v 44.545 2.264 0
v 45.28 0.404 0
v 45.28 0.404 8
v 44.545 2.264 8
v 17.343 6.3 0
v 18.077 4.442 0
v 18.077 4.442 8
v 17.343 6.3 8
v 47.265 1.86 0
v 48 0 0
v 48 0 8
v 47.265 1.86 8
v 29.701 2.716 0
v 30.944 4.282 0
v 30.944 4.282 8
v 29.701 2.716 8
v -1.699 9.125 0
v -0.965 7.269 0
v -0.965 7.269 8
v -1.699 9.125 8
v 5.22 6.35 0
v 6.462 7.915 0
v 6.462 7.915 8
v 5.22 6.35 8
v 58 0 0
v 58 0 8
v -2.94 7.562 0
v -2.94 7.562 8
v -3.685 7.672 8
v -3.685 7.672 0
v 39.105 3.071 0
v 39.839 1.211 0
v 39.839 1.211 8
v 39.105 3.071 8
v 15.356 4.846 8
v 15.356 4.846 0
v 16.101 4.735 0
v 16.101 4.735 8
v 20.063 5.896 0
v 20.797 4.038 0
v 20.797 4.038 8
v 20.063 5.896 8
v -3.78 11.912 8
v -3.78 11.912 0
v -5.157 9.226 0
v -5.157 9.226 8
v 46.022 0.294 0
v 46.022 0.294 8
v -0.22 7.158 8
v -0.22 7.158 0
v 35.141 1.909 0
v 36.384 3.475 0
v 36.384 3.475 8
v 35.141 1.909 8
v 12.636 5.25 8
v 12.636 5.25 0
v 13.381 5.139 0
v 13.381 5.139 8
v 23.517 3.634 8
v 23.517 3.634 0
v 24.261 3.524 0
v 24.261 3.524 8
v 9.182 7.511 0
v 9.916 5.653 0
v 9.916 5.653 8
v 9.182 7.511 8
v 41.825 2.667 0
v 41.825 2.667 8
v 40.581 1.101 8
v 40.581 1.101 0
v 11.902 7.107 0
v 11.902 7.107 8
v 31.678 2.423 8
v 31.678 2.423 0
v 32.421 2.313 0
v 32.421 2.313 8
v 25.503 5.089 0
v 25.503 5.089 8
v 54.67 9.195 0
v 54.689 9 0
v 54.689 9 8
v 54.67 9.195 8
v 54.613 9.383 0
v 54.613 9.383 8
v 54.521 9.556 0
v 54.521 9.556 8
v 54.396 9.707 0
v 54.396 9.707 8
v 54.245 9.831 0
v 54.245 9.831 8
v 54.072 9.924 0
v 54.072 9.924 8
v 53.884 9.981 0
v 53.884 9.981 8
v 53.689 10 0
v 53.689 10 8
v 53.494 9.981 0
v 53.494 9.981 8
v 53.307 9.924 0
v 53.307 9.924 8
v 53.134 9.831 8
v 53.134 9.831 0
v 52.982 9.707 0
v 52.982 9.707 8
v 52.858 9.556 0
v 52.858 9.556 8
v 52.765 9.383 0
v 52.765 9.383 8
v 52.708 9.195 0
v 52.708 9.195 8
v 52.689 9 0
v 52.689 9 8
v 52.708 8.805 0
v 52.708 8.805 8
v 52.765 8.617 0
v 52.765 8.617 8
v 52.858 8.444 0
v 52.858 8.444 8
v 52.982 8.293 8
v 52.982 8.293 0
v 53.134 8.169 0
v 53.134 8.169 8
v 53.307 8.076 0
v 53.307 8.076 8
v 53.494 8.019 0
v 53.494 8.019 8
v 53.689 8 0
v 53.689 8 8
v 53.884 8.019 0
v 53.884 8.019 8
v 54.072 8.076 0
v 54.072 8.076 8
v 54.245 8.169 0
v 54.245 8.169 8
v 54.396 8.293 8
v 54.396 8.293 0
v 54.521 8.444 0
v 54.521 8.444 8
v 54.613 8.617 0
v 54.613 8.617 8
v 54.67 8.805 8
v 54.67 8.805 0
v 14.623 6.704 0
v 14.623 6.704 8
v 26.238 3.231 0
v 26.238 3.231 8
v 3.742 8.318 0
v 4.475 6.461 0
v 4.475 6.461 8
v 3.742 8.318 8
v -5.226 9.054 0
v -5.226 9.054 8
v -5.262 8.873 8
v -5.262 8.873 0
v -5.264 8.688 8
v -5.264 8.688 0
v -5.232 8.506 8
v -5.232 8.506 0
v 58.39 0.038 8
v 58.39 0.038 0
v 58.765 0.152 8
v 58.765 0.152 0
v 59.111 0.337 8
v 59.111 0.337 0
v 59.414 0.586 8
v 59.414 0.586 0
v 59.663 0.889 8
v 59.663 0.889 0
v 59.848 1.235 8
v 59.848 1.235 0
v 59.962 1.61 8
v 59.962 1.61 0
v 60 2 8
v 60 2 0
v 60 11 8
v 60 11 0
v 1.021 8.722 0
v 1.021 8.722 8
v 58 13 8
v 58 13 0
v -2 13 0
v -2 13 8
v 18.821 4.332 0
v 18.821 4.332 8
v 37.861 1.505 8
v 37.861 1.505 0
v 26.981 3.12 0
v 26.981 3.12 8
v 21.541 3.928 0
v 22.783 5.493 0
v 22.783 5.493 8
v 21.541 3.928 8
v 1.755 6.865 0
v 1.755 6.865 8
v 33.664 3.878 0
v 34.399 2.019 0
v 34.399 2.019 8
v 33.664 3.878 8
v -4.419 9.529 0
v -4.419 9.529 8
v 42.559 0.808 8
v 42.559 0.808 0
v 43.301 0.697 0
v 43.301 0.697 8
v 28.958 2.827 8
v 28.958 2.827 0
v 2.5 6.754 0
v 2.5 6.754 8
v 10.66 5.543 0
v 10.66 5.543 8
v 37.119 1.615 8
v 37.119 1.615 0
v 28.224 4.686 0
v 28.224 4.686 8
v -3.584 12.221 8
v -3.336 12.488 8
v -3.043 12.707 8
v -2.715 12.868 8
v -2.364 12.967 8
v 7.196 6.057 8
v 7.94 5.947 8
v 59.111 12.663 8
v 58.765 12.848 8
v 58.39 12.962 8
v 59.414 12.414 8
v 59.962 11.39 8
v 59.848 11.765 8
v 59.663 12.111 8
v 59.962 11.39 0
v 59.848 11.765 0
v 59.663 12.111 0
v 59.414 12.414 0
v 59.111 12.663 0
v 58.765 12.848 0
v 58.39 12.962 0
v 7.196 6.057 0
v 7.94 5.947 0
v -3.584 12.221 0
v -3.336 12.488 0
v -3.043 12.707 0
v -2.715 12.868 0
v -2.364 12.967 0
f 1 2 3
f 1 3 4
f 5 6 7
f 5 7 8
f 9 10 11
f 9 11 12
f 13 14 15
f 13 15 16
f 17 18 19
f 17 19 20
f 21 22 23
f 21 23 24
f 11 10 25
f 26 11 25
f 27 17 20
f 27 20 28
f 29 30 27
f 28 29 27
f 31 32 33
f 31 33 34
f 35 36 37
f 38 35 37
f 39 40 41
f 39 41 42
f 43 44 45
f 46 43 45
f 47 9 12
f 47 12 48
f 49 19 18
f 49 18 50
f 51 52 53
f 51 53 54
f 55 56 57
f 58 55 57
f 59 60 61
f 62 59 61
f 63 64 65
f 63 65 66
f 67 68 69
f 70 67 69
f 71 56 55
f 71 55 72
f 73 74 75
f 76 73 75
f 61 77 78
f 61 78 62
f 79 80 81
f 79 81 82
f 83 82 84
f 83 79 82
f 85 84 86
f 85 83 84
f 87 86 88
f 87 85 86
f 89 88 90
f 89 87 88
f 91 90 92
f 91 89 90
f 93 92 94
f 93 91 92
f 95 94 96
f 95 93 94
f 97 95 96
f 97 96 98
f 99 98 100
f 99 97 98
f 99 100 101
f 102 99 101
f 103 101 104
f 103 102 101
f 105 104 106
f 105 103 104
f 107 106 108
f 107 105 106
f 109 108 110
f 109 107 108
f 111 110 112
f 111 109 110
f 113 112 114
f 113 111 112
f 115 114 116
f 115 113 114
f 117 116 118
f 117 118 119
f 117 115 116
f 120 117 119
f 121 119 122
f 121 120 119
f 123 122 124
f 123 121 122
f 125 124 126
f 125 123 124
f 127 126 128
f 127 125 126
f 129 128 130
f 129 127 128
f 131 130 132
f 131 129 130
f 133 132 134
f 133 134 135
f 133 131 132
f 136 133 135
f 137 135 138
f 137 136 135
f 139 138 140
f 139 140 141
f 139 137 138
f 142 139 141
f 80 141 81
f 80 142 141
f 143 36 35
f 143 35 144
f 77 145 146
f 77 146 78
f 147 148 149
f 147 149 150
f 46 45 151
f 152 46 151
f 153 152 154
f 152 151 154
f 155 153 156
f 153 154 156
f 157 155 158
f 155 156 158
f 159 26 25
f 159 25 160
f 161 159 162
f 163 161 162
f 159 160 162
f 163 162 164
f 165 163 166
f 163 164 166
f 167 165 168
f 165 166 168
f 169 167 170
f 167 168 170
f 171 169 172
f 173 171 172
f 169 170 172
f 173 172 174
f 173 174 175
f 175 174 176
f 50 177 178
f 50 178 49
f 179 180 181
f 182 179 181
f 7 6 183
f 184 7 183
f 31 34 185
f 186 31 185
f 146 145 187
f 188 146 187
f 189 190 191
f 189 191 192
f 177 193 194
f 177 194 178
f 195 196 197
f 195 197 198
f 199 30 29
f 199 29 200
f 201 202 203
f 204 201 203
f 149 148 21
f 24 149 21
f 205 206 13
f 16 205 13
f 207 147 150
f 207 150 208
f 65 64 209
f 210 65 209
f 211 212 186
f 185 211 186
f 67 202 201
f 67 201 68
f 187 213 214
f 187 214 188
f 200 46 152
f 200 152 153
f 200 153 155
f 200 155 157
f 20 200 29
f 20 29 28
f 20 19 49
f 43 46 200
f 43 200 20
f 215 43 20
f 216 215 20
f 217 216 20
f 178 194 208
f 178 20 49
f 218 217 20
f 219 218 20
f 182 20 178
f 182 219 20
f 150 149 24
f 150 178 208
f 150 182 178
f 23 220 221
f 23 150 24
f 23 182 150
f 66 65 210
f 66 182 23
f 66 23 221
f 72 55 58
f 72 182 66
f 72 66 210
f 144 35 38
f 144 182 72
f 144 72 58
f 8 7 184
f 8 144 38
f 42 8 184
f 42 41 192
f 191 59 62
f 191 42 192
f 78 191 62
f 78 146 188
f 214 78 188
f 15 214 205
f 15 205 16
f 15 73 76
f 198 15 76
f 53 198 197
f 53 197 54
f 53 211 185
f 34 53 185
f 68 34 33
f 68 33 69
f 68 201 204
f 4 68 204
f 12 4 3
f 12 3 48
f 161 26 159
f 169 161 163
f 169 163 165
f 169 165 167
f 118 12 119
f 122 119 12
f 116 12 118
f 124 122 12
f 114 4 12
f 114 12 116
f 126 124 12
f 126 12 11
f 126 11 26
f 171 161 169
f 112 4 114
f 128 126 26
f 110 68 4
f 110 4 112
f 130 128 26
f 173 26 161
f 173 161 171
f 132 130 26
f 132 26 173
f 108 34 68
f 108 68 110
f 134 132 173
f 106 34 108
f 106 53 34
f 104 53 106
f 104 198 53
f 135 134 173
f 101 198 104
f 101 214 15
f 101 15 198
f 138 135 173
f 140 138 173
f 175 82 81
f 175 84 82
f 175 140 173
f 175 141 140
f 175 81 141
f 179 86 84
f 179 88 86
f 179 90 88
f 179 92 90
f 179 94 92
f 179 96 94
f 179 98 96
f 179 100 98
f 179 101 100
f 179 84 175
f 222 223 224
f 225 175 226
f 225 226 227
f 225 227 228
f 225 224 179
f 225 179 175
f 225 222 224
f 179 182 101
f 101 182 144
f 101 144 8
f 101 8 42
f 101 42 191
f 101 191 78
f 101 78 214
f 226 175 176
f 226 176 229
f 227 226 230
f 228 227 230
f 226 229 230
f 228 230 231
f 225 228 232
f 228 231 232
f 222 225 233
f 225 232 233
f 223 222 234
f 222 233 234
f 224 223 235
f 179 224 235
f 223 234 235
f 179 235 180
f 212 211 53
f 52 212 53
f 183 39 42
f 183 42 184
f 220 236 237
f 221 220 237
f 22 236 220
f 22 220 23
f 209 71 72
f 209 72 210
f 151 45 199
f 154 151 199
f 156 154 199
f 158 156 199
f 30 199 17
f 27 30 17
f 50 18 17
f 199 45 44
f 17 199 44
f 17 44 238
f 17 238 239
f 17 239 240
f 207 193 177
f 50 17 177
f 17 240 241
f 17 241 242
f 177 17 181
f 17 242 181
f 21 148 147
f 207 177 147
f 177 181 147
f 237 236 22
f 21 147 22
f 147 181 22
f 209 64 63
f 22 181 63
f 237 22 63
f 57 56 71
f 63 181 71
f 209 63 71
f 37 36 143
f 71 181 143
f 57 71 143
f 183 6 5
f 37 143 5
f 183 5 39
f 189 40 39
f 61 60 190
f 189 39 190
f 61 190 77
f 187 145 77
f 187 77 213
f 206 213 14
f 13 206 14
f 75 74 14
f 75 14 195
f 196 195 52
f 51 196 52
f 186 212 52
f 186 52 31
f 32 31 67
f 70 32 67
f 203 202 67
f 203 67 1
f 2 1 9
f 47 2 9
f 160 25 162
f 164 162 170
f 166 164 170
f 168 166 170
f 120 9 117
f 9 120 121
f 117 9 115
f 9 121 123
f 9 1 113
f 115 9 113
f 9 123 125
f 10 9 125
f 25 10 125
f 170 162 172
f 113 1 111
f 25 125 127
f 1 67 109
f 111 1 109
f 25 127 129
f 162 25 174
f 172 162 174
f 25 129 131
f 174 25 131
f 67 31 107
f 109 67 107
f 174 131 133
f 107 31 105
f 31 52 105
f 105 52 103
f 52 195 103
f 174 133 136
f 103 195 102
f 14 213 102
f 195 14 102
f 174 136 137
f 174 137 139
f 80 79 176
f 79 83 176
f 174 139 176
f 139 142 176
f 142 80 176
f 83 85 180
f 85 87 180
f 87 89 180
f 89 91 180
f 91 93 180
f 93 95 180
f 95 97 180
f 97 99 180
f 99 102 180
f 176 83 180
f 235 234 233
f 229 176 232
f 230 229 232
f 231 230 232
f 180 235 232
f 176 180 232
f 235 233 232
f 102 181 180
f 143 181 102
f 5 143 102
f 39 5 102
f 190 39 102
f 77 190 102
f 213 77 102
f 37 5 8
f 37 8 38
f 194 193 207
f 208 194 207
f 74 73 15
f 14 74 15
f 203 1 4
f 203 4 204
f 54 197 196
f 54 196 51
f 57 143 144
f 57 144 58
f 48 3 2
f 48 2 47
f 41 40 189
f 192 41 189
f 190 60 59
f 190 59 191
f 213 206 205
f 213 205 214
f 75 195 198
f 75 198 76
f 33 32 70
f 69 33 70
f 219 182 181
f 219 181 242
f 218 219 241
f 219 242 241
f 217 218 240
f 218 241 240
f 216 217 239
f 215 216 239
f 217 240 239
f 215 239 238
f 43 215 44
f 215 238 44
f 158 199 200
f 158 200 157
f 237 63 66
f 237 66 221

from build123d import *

# Parameters (mm, degrees)
SKETCH1_R           = 1
BOSS_EXTRUDE1_DEPTH = 8
CUT_EXTRUDE1_START  = -10
CUT_EXTRUDE1_DEPTH  = 10


with BuildPart() as part:
    # Sketch1 → Boss-Extrude1 (new body)
    with BuildSketch(Plane.XY):
        with BuildLine():
            Line((-4.413883096, 7.780619908), (48, 0))
            Line((48, 0), (58, 0))
            ThreePointArc((58, 0), (59.414213562, 0.585786438), (60, 2))
            Line((60, 2), (60, 11))
            ThreePointArc((60, 11), (59.414213562, 12.414213562), (58, 13))
            Line((58, 13), (-2, 13))
            ThreePointArc((-2, 13), (-3.042889965, 12.706569811), (-3.779764531, 11.912380521))
            Line((-3.779764531, 11.912380521), (-5.156928621, 9.22597091))
            ThreePointArc((-5.156928621, 9.22597091), (-5.156403682, 8.312567847), (-4.413883096, 7.780619908))
        make_face()
        with Locations((53.689231255, 9)):
            Circle(SKETCH1_R, mode=Mode.SUBTRACT)
    extrude(amount=BOSS_EXTRUDE1_DEPTH)

    # Sketch2 → Cut-Extrude1 (cut)
    with BuildSketch(Plane.XY.offset(8).offset(CUT_EXTRUDE1_START)):
        Polygon((-2.939974596, 7.561824407), (-0.965260048, 7.26868636), (-1.698752327, 9.125408347), align=None)
        with BuildLine():
            Line((-4.413883096, 7.780619908), (-3.685452086, 7.672487397))
            Line((-3.685452086, 7.672487397), (-4.418944365, 9.529209384))
            Line((-4.418944365, 9.529209384), (-5.231519115, 8.505598334))
            ThreePointArc((-5.231519115, 8.505598334), (-4.930484846, 8.021549823), (-4.413883096, 7.780619908))
        make_face()
        Polygon((-0.219982955, 7.158053119), (1.755132364, 6.864855579), (1.021491222, 8.72195439), align=None)
        Polygon((2.500209083, 6.754252082), (4.475324402, 6.461054542), (3.74168326, 8.318153353), align=None)
        Polygon((5.220200725, 6.350480793), (7.195716813, 6.057223761), (6.461926809, 7.914699396), align=None)
        Polygon((7.940392763, 5.946679757), (9.915908851, 5.653422725), (9.182118847, 7.510898359), align=None)
        Polygon((10.660384404, 5.542908468), (12.636301263, 5.249591943), (11.902362396, 7.107444402), align=None)
        Polygon((13.380576442, 5.139107432), (15.356493301, 4.845790907), (14.622554434, 6.703643365), align=None)
        Polygon((16.100568083, 4.735336143), (18.076885713, 4.441960126), (17.342797982, 6.300189408), align=None)
        Polygon((18.820760121, 4.331535107), (20.797077751, 4.038159089), (20.06299002, 5.896388371), align=None)
        Polygon((21.540751763, 3.927763818), (23.517470163, 3.634328308), (22.783233569, 5.492934414), align=None)
        Polygon((24.260943801, 3.523962782), (26.237662201, 3.230527271), (25.503425607, 5.089133377), align=None)
        Polygon((26.980935442, 3.120191493), (28.958054613, 2.82669649), (28.223669156, 4.68567942), align=None)
        Polygon((29.70112748, 2.716390456), (31.678246651, 2.422895453), (30.943861194, 4.281878383), align=None)
        Polygon((46.021678518, 0.293673481), (48, 0), (47.265167954, 1.860113401), align=None)
        Polygon((43.30148648, 0.697474518), (45.279807962, 0.403801037), (44.544975916, 2.263914437), align=None)
        Polygon((40.581494839, 1.101245806), (42.55941555, 0.807631818), (41.824732367, 2.667368395), align=None)
        Polygon((37.861302801, 1.505046843), (39.839223512, 1.211432854), (39.104540329, 3.071169432), align=None)
        Polygon((35.141311159, 1.908818131), (37.1188311, 1.615263636), (36.384296781, 3.474623389), align=None)
        Polygon((32.421119121, 2.312619168), (34.398639063, 2.019064672), (33.664104743, 3.878424426), align=None)
    extrude(amount=CUT_EXTRUDE1_DEPTH, mode=Mode.SUBTRACT)


solid = part.part
